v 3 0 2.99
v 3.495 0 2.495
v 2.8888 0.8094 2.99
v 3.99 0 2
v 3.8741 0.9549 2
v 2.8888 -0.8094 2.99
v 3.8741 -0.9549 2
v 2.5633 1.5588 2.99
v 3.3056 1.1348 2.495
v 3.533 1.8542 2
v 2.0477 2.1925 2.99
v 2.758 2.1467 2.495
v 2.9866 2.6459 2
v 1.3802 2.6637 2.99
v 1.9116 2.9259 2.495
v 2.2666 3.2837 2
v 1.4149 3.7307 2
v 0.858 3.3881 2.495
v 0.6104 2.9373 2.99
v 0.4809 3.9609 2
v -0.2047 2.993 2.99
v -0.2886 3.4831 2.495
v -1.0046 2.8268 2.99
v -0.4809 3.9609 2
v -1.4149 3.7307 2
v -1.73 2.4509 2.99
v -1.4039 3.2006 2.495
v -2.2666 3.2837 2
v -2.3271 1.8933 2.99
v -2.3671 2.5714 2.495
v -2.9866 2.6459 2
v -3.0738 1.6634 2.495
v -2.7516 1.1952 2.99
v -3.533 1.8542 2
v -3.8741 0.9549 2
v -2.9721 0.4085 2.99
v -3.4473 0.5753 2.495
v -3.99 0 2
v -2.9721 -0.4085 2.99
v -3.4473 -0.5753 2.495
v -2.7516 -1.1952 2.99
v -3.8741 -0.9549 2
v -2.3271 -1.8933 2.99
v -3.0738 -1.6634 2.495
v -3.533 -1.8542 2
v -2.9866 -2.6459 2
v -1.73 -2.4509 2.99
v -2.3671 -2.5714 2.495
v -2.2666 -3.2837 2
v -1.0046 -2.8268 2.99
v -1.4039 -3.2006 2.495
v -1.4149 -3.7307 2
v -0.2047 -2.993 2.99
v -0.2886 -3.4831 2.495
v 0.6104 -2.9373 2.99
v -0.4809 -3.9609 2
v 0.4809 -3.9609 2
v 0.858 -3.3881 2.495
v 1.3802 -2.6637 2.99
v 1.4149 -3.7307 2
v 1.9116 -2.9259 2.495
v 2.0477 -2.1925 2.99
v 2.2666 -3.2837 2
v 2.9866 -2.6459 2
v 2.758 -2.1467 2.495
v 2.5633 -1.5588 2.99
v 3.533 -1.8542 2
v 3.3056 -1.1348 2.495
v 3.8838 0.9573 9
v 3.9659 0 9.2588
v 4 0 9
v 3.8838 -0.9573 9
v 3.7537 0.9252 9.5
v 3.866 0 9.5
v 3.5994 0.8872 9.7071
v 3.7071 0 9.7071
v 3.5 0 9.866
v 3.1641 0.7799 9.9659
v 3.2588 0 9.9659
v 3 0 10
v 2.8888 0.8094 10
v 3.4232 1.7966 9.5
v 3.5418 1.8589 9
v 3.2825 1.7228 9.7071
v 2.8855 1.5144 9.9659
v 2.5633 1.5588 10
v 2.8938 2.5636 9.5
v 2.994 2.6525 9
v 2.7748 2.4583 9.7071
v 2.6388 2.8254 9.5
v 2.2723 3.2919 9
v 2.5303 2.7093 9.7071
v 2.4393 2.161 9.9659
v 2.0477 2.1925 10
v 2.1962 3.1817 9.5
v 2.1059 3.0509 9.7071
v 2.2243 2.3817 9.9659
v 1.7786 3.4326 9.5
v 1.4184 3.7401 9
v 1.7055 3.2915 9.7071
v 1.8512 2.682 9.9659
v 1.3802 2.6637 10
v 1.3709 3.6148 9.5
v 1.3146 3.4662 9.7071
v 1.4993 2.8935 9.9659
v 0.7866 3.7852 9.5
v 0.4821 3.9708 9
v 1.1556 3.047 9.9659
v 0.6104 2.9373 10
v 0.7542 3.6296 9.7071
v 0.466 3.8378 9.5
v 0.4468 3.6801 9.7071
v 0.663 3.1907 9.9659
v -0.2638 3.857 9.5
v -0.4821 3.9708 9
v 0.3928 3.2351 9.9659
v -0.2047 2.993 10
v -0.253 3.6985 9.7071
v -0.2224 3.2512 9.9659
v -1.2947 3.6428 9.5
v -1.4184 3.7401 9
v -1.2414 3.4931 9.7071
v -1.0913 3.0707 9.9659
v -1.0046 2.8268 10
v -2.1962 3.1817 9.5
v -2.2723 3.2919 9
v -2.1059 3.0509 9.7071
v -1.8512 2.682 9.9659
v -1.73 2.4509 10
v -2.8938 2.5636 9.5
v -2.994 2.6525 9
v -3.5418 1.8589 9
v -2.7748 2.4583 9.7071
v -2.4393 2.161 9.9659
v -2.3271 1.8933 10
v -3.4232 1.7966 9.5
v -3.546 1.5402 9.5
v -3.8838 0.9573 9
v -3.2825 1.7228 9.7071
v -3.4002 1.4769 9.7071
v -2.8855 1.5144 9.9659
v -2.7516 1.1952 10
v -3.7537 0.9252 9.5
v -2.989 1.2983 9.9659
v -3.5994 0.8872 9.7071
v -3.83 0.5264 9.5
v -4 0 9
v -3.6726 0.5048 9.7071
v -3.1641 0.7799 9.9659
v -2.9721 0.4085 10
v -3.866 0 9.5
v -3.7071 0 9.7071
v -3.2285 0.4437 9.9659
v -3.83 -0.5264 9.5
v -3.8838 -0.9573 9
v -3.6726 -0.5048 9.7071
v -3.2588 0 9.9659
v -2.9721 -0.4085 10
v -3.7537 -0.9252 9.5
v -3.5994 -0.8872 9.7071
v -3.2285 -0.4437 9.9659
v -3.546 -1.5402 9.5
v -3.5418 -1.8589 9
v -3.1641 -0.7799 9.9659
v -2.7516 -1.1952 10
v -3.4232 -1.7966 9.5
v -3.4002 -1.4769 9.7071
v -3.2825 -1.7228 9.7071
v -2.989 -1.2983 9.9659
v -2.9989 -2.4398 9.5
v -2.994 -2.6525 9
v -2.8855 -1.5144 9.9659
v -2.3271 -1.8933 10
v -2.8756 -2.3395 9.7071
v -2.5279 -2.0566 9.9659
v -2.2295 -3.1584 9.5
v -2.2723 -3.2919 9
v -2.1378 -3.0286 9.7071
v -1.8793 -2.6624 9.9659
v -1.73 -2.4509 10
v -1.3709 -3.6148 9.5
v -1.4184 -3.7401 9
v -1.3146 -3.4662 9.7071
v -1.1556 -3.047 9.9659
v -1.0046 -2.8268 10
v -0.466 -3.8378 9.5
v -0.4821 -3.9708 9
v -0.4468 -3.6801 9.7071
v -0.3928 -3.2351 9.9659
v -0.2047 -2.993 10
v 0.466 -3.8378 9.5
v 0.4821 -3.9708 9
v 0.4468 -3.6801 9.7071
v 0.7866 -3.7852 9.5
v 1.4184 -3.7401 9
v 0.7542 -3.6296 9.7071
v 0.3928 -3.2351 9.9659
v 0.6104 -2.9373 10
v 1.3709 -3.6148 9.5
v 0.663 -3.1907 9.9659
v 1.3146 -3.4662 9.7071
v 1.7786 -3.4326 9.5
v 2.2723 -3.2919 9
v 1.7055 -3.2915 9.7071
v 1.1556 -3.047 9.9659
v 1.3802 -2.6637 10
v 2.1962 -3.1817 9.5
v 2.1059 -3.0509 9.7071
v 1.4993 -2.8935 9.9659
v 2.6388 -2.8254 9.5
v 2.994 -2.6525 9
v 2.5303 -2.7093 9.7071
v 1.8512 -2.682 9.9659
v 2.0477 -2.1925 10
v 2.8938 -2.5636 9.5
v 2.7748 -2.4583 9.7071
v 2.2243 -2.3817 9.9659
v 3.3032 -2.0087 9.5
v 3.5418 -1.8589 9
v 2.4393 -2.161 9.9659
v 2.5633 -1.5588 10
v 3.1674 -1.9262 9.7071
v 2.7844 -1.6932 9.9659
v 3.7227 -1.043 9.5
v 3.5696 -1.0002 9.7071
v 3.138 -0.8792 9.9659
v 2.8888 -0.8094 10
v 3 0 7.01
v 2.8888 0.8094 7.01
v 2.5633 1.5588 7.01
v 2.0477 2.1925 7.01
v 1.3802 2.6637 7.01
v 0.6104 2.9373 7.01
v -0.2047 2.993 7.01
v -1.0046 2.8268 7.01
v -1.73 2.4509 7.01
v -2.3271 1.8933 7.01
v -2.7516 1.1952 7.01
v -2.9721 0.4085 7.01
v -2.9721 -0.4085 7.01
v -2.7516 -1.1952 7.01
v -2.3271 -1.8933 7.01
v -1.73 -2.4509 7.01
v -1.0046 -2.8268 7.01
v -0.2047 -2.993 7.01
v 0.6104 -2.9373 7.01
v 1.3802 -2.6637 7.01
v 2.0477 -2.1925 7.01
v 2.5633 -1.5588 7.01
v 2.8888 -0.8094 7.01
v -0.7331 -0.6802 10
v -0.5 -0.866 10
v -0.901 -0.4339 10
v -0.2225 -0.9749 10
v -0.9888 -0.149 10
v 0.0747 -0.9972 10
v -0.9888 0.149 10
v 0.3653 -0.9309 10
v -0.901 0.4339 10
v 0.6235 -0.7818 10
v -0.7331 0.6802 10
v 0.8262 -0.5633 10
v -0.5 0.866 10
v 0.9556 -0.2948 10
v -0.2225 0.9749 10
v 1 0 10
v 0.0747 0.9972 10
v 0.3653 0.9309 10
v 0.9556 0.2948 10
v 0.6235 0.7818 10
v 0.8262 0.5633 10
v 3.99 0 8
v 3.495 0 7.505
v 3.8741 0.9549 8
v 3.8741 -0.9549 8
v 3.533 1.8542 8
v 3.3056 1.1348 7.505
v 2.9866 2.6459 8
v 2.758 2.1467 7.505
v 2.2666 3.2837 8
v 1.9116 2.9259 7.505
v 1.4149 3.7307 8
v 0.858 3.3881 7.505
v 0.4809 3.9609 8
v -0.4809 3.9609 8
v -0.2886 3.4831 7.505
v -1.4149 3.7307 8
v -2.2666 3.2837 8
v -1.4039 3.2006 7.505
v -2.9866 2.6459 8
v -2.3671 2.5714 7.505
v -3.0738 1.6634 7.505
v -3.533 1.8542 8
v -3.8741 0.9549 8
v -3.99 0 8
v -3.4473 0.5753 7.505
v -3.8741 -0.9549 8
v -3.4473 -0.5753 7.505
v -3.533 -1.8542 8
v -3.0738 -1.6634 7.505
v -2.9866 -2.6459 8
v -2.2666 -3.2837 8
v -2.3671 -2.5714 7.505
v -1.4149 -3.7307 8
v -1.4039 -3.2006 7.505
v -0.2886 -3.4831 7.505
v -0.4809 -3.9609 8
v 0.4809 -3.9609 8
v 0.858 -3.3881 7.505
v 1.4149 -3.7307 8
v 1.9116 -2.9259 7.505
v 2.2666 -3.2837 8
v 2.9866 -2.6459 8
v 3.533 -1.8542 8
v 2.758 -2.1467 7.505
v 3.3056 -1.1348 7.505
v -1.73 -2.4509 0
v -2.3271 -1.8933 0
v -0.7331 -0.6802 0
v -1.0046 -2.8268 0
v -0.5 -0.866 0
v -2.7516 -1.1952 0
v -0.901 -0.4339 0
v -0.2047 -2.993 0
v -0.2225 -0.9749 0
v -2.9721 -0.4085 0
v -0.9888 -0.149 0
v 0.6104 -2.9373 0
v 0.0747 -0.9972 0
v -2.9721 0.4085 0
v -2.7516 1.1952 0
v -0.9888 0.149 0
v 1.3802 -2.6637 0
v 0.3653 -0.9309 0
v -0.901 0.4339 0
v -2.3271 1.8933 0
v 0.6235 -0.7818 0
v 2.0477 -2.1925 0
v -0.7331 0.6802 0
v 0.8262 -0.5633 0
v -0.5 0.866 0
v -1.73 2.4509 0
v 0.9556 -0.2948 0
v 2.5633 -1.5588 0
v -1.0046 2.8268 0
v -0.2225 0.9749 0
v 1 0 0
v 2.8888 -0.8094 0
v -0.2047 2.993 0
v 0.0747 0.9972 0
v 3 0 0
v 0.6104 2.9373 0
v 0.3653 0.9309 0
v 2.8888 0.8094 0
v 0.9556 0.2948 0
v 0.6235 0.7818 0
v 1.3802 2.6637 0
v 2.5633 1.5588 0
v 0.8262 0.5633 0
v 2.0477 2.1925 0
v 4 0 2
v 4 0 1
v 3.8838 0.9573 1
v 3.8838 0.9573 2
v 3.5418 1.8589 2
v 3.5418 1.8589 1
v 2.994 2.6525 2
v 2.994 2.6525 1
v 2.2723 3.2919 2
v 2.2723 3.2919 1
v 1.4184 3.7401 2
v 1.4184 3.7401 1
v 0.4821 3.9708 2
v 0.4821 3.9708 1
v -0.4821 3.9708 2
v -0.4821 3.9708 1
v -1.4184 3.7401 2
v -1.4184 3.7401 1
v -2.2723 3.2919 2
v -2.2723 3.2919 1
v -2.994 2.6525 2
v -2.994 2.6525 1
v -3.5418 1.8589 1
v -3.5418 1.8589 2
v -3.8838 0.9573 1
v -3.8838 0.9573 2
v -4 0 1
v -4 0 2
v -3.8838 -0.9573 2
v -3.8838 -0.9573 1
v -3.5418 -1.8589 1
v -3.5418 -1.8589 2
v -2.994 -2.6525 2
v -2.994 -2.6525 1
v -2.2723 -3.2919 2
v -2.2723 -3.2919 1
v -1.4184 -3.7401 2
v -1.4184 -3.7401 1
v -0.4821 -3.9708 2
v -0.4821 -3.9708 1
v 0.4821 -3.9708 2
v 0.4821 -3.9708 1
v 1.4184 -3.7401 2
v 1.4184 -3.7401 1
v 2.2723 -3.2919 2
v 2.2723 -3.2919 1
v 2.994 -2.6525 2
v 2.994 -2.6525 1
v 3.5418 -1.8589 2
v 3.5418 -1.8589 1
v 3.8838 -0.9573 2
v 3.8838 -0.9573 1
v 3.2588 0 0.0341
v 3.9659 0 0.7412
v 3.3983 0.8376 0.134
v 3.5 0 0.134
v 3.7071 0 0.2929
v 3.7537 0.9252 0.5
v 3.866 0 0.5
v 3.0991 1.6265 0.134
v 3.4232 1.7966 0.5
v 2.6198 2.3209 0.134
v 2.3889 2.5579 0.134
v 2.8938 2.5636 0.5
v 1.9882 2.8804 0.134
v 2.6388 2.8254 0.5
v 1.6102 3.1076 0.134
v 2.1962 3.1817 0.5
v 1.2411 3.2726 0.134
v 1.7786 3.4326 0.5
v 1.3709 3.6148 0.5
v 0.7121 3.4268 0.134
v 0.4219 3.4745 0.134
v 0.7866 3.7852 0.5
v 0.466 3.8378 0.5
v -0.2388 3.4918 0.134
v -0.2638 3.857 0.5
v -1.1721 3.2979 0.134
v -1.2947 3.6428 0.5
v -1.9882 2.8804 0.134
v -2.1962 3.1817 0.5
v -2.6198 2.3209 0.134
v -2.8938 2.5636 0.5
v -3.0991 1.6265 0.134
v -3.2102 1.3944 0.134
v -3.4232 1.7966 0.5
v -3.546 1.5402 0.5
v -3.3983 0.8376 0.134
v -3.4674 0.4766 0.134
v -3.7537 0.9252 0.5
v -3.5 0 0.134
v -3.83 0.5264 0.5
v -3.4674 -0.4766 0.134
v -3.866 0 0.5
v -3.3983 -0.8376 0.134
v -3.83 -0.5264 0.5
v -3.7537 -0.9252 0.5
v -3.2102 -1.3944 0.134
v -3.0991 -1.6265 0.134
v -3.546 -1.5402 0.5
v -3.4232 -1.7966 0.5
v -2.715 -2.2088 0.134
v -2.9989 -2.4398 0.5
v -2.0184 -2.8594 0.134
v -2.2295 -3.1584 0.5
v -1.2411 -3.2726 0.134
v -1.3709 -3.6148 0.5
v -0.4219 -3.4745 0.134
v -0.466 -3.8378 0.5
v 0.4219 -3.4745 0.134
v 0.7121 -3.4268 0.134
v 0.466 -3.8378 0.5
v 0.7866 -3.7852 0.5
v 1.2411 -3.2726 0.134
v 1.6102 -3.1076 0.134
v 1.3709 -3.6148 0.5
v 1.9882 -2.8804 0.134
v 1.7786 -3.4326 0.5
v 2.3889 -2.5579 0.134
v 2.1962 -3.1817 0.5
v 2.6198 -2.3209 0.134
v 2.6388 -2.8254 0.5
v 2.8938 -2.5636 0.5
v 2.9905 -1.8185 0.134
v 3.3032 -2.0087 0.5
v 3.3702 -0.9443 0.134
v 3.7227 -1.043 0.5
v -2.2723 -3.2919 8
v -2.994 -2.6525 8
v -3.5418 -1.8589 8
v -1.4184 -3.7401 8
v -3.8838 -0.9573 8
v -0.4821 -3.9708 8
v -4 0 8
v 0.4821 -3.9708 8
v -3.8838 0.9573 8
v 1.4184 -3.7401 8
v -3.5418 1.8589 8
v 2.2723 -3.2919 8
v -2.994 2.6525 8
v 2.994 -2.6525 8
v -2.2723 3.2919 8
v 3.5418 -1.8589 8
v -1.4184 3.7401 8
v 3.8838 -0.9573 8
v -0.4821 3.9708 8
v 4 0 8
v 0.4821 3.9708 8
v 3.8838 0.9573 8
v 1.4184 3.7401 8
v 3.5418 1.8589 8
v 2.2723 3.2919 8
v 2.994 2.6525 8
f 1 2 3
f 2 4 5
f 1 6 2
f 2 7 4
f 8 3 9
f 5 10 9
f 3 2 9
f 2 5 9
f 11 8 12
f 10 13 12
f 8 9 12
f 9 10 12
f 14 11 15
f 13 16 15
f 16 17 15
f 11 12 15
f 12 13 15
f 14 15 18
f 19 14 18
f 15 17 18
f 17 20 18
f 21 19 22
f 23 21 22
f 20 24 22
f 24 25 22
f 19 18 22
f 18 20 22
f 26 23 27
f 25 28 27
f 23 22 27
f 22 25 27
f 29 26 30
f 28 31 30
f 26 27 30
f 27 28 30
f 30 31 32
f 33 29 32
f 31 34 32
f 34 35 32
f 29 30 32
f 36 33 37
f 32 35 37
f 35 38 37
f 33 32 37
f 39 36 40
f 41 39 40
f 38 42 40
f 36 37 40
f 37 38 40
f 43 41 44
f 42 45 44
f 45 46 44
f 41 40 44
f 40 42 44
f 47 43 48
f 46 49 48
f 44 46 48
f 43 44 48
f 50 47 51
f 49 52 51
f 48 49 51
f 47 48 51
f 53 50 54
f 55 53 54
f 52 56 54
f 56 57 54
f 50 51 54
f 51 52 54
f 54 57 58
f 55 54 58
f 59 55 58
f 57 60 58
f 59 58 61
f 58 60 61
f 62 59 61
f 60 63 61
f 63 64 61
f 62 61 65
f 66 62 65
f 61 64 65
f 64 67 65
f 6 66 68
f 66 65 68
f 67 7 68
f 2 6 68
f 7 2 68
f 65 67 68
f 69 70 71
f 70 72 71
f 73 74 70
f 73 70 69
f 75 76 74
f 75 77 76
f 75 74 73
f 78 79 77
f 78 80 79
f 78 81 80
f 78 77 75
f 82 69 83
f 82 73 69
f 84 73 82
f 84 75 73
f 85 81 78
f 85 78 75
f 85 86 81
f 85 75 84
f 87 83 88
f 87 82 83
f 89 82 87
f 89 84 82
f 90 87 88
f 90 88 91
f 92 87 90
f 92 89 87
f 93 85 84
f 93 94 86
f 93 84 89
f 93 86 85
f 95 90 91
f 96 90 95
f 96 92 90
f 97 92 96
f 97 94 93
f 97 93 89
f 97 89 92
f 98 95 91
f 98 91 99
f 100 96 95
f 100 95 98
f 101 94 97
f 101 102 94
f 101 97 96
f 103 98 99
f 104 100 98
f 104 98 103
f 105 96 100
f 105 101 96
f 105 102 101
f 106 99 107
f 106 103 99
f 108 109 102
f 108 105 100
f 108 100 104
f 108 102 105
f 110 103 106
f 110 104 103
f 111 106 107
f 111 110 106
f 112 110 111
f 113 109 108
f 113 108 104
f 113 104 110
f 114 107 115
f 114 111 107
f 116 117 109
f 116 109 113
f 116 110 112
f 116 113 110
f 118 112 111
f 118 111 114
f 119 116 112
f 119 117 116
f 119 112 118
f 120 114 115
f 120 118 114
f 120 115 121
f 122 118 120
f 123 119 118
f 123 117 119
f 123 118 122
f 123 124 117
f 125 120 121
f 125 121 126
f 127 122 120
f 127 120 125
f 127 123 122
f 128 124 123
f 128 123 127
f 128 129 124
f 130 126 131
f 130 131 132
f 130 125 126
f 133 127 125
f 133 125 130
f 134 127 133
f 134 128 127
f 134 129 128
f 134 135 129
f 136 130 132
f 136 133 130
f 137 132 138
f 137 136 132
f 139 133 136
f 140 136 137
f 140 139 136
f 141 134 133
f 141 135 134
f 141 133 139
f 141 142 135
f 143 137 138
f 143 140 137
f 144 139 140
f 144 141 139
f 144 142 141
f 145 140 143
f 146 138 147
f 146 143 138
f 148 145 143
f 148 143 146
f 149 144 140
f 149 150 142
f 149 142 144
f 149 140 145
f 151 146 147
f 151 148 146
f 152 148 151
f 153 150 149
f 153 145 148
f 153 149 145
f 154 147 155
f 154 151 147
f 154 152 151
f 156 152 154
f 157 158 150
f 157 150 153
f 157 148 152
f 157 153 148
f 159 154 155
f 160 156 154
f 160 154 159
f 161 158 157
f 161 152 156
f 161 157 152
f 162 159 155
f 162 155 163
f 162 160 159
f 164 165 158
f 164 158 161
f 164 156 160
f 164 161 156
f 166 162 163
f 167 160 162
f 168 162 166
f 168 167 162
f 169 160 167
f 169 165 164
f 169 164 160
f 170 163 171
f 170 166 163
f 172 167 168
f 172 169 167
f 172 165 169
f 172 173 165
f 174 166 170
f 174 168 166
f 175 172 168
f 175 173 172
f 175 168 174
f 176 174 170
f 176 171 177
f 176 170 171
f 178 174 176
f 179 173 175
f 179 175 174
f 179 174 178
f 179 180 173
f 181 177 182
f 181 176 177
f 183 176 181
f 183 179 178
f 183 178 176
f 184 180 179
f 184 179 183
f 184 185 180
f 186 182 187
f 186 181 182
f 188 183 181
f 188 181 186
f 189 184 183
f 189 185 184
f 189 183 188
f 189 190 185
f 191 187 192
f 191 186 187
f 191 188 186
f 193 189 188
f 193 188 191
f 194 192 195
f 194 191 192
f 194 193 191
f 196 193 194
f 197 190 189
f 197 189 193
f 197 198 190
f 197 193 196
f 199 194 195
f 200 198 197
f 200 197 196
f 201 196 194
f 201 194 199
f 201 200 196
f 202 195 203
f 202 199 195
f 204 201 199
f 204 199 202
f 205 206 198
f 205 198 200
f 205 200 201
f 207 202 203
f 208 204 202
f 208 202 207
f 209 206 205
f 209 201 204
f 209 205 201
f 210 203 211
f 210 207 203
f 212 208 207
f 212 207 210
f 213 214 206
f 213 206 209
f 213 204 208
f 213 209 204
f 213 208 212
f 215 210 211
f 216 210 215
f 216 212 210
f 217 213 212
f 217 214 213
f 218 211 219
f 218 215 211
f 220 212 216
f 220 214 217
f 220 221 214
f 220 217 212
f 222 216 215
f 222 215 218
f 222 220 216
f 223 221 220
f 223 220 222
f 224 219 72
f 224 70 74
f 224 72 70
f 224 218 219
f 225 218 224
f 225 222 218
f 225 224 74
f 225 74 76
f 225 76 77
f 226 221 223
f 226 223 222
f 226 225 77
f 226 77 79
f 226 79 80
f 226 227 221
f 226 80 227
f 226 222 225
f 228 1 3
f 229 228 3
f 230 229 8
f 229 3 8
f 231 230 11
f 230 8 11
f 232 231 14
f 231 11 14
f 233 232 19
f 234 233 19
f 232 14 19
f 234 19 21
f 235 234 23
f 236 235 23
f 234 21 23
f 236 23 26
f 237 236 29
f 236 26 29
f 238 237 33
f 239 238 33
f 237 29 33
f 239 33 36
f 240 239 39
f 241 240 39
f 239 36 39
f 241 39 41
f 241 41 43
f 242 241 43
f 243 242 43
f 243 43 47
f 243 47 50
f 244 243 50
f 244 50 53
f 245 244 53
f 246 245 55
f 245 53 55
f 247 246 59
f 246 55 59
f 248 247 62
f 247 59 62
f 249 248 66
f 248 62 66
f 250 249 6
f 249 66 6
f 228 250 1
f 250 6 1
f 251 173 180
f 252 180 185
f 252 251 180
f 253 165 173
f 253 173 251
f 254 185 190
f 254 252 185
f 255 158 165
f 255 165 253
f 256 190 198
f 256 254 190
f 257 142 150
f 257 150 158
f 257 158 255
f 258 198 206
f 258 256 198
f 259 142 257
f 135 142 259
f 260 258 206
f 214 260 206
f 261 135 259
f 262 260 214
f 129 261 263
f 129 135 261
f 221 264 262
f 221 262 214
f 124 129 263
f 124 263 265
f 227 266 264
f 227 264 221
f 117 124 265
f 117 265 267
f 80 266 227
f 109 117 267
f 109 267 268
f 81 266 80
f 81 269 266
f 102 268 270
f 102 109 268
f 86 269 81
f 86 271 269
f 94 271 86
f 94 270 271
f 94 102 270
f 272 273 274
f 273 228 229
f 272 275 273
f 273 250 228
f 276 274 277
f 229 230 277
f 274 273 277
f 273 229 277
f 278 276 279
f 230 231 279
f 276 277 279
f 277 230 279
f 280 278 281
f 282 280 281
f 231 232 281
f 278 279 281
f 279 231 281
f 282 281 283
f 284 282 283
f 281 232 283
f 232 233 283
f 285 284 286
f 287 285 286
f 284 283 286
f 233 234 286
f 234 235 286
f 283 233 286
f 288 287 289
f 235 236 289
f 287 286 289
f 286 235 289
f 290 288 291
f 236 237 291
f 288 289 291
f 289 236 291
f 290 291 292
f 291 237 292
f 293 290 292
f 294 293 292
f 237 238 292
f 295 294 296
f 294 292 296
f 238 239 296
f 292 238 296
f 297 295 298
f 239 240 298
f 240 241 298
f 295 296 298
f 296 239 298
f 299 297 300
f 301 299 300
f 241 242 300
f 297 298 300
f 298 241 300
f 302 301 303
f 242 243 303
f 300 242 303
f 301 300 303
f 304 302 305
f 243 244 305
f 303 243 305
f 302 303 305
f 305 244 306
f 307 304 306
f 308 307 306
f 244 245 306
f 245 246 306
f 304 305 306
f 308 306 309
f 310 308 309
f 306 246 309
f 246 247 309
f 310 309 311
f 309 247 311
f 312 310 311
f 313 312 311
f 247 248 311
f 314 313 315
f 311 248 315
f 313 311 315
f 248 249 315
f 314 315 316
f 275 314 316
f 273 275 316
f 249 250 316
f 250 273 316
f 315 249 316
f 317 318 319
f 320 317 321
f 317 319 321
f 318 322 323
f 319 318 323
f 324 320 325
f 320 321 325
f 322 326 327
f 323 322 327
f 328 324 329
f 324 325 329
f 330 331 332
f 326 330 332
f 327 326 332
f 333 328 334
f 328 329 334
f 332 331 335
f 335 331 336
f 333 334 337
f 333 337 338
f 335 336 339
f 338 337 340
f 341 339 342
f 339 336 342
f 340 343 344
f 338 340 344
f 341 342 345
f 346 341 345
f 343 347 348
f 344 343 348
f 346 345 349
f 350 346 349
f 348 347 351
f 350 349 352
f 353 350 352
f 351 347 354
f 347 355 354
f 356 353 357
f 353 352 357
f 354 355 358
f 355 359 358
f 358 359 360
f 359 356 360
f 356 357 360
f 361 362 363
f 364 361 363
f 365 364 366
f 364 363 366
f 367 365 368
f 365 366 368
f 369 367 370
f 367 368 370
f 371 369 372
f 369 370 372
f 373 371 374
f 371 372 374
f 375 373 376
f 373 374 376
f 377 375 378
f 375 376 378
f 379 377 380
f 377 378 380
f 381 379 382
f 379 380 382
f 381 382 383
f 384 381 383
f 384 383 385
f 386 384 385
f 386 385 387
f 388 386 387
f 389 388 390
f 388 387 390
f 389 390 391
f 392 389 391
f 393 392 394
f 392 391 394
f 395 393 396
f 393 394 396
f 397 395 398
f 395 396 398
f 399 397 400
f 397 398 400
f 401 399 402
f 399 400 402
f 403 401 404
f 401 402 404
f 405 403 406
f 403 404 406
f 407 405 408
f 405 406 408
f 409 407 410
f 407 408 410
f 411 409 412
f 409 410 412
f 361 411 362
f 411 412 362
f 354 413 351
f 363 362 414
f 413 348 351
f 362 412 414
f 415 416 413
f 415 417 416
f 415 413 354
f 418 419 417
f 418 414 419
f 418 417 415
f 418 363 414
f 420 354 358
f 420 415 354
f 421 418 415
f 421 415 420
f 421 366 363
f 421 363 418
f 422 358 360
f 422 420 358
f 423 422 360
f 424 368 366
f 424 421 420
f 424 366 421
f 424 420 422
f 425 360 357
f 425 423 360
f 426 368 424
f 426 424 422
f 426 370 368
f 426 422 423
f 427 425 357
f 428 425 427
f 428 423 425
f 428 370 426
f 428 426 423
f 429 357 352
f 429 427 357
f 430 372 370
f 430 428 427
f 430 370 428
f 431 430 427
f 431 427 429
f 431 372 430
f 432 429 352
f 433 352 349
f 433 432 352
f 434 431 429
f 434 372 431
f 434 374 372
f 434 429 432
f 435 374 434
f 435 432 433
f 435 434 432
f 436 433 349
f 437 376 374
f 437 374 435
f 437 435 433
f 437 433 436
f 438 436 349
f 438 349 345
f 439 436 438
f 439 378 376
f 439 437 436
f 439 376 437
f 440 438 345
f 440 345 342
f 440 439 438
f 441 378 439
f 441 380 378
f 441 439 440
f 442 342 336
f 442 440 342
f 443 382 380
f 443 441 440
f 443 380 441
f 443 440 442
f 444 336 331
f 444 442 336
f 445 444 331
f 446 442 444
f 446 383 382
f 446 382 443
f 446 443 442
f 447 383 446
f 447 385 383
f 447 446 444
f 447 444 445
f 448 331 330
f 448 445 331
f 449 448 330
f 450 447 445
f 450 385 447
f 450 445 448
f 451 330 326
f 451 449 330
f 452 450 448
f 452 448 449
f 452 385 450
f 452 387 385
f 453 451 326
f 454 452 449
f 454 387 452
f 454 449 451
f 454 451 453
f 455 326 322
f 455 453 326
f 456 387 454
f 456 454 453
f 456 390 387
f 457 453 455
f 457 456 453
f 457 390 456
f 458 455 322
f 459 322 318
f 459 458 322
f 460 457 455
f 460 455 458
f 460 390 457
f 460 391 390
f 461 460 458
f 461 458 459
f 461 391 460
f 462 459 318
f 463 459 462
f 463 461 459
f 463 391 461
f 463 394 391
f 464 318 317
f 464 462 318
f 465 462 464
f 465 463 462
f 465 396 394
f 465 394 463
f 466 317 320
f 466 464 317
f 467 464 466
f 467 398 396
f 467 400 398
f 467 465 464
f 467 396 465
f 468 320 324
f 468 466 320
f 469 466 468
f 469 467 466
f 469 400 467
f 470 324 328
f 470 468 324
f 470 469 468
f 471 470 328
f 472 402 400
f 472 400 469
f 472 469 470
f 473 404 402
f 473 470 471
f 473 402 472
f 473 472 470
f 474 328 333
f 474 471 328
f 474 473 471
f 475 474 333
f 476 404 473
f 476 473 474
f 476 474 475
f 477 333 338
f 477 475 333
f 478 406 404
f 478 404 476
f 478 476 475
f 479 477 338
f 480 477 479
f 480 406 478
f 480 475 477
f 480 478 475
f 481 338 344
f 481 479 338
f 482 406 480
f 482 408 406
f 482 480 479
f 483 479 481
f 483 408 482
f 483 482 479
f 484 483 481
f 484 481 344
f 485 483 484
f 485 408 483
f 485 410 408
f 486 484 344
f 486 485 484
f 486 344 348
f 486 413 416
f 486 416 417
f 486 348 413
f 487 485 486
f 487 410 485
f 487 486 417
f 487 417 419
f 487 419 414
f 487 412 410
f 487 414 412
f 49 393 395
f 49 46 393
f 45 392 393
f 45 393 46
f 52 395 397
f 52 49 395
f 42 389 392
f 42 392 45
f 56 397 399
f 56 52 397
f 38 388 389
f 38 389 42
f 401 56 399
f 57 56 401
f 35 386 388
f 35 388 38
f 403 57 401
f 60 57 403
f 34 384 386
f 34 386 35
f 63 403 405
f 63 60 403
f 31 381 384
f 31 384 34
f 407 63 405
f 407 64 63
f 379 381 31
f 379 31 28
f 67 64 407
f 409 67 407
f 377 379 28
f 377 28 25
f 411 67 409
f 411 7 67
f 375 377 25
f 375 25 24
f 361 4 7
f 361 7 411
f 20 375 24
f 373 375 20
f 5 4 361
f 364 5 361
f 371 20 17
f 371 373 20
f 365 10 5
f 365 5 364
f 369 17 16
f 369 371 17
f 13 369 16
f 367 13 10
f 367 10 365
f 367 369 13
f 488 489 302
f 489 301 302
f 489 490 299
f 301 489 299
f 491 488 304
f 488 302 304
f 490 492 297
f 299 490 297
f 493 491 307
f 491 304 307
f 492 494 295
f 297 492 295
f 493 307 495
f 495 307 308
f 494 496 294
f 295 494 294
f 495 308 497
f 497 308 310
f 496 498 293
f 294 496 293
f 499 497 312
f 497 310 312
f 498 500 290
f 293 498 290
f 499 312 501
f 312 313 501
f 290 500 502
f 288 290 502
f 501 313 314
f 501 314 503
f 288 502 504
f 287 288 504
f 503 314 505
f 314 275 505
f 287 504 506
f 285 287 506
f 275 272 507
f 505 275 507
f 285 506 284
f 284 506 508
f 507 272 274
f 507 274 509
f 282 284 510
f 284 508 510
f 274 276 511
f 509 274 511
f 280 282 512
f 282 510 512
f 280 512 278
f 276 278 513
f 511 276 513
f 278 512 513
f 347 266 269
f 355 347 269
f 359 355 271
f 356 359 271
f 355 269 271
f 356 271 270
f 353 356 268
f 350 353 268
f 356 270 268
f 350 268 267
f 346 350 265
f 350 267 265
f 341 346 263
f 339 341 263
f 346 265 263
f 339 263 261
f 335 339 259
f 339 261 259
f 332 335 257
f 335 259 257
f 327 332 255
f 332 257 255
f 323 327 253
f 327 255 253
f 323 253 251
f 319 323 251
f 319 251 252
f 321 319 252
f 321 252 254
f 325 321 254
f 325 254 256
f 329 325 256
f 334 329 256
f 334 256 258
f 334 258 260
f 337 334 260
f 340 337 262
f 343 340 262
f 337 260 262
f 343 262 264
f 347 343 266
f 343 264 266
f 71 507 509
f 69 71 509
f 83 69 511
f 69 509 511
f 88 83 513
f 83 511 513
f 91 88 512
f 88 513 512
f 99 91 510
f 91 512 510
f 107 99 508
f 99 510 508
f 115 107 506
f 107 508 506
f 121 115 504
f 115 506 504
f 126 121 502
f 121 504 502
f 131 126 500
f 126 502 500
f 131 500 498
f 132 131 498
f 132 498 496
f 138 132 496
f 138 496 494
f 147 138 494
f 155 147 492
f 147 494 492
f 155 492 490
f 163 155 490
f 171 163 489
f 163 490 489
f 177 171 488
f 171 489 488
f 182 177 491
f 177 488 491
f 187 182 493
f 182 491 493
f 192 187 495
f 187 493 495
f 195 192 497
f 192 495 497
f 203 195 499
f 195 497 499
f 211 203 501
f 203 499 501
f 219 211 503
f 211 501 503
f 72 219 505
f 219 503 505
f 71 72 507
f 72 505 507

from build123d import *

# Parameters (mm, degrees)
SKETCH_R     = 4
PAD_DEPTH    = 2
SKETCH001_R  = 3
PAD001_DEPTH = 6
SKETCH002_R  = 4
PAD002_DEPTH = 2
SKETCH003_R  = 1
POCKET_DEPTH = 10
CHAMFER_SIZE = 0.99
FILLET_R     = 1


with BuildPart() as part:
    # Sketch → Pad (new body)
    with BuildSketch(Plane.XY):
        Circle(SKETCH_R)
    extrude(amount=PAD_DEPTH)

    # Sketch001 (on Face3 of Pad) → Pad001 (join)
    with BuildSketch(Plane.XY.offset(2)):
        Circle(SKETCH001_R)
    extrude(amount=PAD001_DEPTH)

    # Sketch002 (on Face5 of Pad001) → Pad002 (join)
    with BuildSketch(Plane.XY.offset(8)):
        Circle(SKETCH002_R)
    extrude(amount=PAD002_DEPTH)

    # Sketch003 (on Face3 of Pad002) → Pocket (cut)
    with BuildSketch(Plane.XY.offset(10)):
        Circle(SKETCH003_R)
    extrude(amount=-POCKET_DEPTH, mode=Mode.SUBTRACT)

    # Chamfer
    chamfer_edges = [part.edges().sort_by_distance(p)[0] for p in [
        (-3, 0, 8),
        (-3, 0, 2),
    ]]
    chamfer(chamfer_edges, length=CHAMFER_SIZE)

    # Fillet
    fillet_edges = [part.edges().sort_by_distance(p)[0] for p in [
        (-4, 0, 0),
        (-4, 0, 10),
    ]]
    fillet(fillet_edges, radius=FILLET_R)


solid = part.part
